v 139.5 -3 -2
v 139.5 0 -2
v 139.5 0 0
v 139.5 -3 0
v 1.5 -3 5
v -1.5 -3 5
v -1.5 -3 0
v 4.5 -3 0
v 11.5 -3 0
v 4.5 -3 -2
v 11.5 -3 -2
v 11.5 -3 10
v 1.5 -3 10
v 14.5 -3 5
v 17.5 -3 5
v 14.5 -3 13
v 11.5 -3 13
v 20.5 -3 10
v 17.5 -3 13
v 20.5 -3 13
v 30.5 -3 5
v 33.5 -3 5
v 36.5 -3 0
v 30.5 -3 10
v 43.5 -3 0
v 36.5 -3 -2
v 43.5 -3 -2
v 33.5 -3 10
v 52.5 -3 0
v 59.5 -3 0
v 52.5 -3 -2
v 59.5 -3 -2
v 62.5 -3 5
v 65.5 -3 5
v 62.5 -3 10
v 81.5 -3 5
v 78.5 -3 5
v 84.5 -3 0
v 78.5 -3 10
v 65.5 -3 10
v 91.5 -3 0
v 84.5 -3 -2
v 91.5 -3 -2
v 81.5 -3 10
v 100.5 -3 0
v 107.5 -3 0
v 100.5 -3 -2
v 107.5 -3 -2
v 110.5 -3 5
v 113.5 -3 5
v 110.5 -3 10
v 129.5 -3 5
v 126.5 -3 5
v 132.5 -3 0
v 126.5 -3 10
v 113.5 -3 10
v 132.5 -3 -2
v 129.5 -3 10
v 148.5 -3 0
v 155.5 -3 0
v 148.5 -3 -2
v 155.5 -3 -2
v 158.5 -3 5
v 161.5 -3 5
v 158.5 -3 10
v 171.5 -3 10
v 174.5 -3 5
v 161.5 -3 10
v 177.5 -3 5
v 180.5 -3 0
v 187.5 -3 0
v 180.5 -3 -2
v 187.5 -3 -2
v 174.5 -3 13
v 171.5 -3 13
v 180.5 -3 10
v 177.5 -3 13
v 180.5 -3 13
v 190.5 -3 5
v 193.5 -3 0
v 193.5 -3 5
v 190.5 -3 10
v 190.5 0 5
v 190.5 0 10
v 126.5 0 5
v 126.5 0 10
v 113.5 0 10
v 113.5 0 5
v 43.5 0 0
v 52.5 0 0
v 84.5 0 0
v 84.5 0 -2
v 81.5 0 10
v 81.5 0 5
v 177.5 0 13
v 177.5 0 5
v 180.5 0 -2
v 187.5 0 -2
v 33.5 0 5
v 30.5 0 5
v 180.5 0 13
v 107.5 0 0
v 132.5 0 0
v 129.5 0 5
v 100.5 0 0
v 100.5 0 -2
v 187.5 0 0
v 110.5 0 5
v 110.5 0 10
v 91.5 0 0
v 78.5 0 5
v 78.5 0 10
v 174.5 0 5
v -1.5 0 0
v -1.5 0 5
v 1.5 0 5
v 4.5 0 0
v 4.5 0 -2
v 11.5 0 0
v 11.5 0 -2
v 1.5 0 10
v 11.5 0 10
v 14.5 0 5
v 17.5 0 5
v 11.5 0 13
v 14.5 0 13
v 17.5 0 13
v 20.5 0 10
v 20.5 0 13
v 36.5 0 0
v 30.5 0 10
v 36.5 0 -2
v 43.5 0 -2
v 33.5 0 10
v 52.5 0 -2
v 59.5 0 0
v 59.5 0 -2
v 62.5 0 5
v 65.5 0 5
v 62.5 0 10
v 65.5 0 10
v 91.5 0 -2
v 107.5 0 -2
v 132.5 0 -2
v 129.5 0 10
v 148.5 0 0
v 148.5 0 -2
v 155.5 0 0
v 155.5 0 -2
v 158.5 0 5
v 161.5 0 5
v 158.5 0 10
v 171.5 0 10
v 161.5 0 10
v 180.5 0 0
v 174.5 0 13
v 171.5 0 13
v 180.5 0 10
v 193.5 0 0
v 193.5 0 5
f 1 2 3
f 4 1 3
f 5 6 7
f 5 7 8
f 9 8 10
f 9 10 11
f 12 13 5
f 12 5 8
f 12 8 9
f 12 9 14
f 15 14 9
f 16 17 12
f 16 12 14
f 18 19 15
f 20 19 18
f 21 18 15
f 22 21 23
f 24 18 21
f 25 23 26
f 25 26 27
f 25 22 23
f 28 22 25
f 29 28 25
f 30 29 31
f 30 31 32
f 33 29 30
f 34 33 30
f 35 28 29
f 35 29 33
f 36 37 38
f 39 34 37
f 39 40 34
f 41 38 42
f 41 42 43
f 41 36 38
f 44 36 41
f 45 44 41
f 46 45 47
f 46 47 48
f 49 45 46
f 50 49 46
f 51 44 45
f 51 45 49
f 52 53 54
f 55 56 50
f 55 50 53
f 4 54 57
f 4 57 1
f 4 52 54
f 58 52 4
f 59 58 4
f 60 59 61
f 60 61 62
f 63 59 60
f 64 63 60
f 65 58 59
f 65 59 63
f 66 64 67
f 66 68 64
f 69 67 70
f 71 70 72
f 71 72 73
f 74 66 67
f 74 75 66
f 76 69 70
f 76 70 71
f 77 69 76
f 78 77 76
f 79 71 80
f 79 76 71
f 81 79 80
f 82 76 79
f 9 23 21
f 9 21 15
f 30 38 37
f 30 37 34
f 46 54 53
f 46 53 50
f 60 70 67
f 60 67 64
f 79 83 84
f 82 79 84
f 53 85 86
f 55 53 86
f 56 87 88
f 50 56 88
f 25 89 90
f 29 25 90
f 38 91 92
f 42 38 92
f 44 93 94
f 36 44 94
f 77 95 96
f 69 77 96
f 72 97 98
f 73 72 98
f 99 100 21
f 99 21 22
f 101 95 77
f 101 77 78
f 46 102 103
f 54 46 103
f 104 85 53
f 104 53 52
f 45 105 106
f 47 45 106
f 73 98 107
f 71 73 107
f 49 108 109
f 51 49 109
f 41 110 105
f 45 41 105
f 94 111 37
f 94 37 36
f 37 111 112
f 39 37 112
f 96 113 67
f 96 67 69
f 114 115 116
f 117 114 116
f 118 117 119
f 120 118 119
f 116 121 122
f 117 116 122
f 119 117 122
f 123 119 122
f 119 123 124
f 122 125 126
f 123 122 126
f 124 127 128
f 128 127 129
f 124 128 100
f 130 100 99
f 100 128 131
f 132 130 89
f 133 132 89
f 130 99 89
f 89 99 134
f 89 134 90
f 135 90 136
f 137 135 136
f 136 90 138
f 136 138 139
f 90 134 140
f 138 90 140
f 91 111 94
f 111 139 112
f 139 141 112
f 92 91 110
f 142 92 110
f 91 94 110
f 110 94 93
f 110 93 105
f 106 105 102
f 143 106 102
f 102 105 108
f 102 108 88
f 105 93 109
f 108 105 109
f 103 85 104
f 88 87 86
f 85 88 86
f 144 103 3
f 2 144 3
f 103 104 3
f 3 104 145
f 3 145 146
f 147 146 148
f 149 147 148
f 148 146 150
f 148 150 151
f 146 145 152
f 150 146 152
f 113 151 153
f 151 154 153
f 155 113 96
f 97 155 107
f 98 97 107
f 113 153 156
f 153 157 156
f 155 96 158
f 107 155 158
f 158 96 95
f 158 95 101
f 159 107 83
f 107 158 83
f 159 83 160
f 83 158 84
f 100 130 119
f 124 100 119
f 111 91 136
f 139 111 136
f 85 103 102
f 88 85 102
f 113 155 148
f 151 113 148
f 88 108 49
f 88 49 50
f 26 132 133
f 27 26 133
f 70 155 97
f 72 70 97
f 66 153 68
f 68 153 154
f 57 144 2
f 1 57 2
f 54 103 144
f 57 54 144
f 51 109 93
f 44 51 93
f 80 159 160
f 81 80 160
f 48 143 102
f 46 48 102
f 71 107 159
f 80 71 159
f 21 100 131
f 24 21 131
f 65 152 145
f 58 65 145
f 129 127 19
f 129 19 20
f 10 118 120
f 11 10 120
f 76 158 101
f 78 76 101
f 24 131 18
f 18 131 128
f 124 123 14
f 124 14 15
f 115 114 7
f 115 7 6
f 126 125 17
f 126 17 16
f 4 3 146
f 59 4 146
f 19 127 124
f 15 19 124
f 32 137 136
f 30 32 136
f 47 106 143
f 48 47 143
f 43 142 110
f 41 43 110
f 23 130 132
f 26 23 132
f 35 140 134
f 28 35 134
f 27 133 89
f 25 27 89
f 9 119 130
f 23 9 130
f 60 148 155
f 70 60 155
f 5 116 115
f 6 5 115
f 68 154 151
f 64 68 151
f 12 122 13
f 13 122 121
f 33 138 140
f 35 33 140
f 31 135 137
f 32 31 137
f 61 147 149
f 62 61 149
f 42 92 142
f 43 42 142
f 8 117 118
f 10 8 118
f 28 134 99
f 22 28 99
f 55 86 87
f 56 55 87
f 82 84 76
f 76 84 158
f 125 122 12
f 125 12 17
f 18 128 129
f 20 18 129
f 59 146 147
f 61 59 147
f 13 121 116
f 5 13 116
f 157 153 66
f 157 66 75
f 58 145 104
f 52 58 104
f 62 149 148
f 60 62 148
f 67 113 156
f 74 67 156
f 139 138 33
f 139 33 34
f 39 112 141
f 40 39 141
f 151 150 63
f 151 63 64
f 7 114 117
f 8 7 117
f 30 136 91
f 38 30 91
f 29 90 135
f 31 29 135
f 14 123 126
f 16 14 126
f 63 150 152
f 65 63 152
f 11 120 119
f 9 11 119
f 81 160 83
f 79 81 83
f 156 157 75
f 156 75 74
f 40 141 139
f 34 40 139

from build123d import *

# Parameters (mm, degrees)
F0_W     = 3
F0_H     = 5
F0_W_2   = 1.5
F0_H_2   = 3
F1_DEPTH = 3


with BuildPart() as f1:
    # F0 (on Front) → F1 (new body)
    with BuildSketch(Plane.XZ):
        Polygon((1.5, 5), (1.5, 0), (4.5, 0), (4.5, -2), (11.5, -2), (11.5, 0), (14.5, 0), (14.5, 5), (14.5, 10), (11.5, 10), (1.5, 10), align=None)
        with Locations((16, 2.5)):
            Rectangle(F0_W, F0_H)
        Polygon((20.5, 10), (17.5, 10), (17.5, 5), (17.5, 0), (30.5, 0), (30.5, 5), (30.5, 10), align=None)
        with Locations((32, 2.5)):
            Rectangle(F0_W, F0_H)
        Polygon((33.5, 5), (33.5, 0), (36.5, 0), (36.5, -2), (43.5, -2), (43.5, 0), (48, 0), (52.5, 0), (52.5, -2), (59.5, -2), (59.5, 0), (62.5, 0), (62.5, 5), (62.5, 10), (33.5, 10), align=None)
        with Locations((64, 2.5)):
            Rectangle(F0_W, F0_H)
        Polygon((78.5, 10), (65.5, 10), (65.5, 5), (65.5, 0), (78.5, 0), (78.5, 5), align=None)
        with Locations((80, 2.5)):
            Rectangle(F0_W, F0_H)
        Polygon((110.5, 10), (81.5, 10), (81.5, 5), (81.5, 0), (84.5, 0), (84.5, -2), (91.5, -2), (91.5, 0), (96, 0), (100.5, 0), (100.5, -2), (107.5, -2), (107.5, 0), (110.5, 0), (110.5, 5), align=None)
        with Locations((112, 2.5)):
            Rectangle(F0_W, F0_H)
        Polygon((126.5, 10), (113.5, 10), (113.5, 5), (113.5, 0), (126.5, 0), (126.5, 5), align=None)
        with Locations((128, 2.5)):
            Rectangle(F0_W, F0_H)
        Polygon((158.5, 10), (129.5, 10), (129.5, 5), (129.5, 0), (132.5, 0), (132.5, -2), (139.5, -2), (139.5, 0), (144, 0), (148.5, 0), (148.5, -2), (155.5, -2), (155.5, 0), (158.5, 0), (158.5, 5), align=None)
        with Locations((160, 2.5)):
            Rectangle(F0_W, F0_H)
        Polygon((171.5, 10), (161.5, 10), (161.5, 5), (161.5, 0), (174.5, 0), (174.5, 5), (174.5, 10), align=None)
        with Locations((176, 2.5)):
            Rectangle(F0_W, F0_H)
        Polygon((180.5, 10), (177.5, 10), (177.5, 5), (177.5, 0), (180.5, 0), (180.5, -2), (187.5, -2), (187.5, 0), (190.5, 0), (190.5, 5), (190.5, 10), align=None)
        with Locations((0.75, 2.5)):
            Rectangle(F0_W_2, F0_H)
        with Locations((191.25, 2.5)):
            Rectangle(F0_W_2, F0_H)
        with Locations((192.75, 2.5)):
            Rectangle(F0_W_2, F0_H)
        with Locations((-0.75, 2.5)):
            Rectangle(F0_W_2, F0_H)
        with Locations((173, 11.5)):
            Rectangle(F0_W, F0_H_2)
        with Locations((179, 11.5)):
            Rectangle(F0_W, F0_H_2)
        with Locations((19, 11.5)):
            Rectangle(F0_W, F0_H_2)
        with Locations((13, 11.5)):
            Rectangle(F0_W, F0_H_2)
    extrude(amount=F1_DEPTH)


solid = f1.part
